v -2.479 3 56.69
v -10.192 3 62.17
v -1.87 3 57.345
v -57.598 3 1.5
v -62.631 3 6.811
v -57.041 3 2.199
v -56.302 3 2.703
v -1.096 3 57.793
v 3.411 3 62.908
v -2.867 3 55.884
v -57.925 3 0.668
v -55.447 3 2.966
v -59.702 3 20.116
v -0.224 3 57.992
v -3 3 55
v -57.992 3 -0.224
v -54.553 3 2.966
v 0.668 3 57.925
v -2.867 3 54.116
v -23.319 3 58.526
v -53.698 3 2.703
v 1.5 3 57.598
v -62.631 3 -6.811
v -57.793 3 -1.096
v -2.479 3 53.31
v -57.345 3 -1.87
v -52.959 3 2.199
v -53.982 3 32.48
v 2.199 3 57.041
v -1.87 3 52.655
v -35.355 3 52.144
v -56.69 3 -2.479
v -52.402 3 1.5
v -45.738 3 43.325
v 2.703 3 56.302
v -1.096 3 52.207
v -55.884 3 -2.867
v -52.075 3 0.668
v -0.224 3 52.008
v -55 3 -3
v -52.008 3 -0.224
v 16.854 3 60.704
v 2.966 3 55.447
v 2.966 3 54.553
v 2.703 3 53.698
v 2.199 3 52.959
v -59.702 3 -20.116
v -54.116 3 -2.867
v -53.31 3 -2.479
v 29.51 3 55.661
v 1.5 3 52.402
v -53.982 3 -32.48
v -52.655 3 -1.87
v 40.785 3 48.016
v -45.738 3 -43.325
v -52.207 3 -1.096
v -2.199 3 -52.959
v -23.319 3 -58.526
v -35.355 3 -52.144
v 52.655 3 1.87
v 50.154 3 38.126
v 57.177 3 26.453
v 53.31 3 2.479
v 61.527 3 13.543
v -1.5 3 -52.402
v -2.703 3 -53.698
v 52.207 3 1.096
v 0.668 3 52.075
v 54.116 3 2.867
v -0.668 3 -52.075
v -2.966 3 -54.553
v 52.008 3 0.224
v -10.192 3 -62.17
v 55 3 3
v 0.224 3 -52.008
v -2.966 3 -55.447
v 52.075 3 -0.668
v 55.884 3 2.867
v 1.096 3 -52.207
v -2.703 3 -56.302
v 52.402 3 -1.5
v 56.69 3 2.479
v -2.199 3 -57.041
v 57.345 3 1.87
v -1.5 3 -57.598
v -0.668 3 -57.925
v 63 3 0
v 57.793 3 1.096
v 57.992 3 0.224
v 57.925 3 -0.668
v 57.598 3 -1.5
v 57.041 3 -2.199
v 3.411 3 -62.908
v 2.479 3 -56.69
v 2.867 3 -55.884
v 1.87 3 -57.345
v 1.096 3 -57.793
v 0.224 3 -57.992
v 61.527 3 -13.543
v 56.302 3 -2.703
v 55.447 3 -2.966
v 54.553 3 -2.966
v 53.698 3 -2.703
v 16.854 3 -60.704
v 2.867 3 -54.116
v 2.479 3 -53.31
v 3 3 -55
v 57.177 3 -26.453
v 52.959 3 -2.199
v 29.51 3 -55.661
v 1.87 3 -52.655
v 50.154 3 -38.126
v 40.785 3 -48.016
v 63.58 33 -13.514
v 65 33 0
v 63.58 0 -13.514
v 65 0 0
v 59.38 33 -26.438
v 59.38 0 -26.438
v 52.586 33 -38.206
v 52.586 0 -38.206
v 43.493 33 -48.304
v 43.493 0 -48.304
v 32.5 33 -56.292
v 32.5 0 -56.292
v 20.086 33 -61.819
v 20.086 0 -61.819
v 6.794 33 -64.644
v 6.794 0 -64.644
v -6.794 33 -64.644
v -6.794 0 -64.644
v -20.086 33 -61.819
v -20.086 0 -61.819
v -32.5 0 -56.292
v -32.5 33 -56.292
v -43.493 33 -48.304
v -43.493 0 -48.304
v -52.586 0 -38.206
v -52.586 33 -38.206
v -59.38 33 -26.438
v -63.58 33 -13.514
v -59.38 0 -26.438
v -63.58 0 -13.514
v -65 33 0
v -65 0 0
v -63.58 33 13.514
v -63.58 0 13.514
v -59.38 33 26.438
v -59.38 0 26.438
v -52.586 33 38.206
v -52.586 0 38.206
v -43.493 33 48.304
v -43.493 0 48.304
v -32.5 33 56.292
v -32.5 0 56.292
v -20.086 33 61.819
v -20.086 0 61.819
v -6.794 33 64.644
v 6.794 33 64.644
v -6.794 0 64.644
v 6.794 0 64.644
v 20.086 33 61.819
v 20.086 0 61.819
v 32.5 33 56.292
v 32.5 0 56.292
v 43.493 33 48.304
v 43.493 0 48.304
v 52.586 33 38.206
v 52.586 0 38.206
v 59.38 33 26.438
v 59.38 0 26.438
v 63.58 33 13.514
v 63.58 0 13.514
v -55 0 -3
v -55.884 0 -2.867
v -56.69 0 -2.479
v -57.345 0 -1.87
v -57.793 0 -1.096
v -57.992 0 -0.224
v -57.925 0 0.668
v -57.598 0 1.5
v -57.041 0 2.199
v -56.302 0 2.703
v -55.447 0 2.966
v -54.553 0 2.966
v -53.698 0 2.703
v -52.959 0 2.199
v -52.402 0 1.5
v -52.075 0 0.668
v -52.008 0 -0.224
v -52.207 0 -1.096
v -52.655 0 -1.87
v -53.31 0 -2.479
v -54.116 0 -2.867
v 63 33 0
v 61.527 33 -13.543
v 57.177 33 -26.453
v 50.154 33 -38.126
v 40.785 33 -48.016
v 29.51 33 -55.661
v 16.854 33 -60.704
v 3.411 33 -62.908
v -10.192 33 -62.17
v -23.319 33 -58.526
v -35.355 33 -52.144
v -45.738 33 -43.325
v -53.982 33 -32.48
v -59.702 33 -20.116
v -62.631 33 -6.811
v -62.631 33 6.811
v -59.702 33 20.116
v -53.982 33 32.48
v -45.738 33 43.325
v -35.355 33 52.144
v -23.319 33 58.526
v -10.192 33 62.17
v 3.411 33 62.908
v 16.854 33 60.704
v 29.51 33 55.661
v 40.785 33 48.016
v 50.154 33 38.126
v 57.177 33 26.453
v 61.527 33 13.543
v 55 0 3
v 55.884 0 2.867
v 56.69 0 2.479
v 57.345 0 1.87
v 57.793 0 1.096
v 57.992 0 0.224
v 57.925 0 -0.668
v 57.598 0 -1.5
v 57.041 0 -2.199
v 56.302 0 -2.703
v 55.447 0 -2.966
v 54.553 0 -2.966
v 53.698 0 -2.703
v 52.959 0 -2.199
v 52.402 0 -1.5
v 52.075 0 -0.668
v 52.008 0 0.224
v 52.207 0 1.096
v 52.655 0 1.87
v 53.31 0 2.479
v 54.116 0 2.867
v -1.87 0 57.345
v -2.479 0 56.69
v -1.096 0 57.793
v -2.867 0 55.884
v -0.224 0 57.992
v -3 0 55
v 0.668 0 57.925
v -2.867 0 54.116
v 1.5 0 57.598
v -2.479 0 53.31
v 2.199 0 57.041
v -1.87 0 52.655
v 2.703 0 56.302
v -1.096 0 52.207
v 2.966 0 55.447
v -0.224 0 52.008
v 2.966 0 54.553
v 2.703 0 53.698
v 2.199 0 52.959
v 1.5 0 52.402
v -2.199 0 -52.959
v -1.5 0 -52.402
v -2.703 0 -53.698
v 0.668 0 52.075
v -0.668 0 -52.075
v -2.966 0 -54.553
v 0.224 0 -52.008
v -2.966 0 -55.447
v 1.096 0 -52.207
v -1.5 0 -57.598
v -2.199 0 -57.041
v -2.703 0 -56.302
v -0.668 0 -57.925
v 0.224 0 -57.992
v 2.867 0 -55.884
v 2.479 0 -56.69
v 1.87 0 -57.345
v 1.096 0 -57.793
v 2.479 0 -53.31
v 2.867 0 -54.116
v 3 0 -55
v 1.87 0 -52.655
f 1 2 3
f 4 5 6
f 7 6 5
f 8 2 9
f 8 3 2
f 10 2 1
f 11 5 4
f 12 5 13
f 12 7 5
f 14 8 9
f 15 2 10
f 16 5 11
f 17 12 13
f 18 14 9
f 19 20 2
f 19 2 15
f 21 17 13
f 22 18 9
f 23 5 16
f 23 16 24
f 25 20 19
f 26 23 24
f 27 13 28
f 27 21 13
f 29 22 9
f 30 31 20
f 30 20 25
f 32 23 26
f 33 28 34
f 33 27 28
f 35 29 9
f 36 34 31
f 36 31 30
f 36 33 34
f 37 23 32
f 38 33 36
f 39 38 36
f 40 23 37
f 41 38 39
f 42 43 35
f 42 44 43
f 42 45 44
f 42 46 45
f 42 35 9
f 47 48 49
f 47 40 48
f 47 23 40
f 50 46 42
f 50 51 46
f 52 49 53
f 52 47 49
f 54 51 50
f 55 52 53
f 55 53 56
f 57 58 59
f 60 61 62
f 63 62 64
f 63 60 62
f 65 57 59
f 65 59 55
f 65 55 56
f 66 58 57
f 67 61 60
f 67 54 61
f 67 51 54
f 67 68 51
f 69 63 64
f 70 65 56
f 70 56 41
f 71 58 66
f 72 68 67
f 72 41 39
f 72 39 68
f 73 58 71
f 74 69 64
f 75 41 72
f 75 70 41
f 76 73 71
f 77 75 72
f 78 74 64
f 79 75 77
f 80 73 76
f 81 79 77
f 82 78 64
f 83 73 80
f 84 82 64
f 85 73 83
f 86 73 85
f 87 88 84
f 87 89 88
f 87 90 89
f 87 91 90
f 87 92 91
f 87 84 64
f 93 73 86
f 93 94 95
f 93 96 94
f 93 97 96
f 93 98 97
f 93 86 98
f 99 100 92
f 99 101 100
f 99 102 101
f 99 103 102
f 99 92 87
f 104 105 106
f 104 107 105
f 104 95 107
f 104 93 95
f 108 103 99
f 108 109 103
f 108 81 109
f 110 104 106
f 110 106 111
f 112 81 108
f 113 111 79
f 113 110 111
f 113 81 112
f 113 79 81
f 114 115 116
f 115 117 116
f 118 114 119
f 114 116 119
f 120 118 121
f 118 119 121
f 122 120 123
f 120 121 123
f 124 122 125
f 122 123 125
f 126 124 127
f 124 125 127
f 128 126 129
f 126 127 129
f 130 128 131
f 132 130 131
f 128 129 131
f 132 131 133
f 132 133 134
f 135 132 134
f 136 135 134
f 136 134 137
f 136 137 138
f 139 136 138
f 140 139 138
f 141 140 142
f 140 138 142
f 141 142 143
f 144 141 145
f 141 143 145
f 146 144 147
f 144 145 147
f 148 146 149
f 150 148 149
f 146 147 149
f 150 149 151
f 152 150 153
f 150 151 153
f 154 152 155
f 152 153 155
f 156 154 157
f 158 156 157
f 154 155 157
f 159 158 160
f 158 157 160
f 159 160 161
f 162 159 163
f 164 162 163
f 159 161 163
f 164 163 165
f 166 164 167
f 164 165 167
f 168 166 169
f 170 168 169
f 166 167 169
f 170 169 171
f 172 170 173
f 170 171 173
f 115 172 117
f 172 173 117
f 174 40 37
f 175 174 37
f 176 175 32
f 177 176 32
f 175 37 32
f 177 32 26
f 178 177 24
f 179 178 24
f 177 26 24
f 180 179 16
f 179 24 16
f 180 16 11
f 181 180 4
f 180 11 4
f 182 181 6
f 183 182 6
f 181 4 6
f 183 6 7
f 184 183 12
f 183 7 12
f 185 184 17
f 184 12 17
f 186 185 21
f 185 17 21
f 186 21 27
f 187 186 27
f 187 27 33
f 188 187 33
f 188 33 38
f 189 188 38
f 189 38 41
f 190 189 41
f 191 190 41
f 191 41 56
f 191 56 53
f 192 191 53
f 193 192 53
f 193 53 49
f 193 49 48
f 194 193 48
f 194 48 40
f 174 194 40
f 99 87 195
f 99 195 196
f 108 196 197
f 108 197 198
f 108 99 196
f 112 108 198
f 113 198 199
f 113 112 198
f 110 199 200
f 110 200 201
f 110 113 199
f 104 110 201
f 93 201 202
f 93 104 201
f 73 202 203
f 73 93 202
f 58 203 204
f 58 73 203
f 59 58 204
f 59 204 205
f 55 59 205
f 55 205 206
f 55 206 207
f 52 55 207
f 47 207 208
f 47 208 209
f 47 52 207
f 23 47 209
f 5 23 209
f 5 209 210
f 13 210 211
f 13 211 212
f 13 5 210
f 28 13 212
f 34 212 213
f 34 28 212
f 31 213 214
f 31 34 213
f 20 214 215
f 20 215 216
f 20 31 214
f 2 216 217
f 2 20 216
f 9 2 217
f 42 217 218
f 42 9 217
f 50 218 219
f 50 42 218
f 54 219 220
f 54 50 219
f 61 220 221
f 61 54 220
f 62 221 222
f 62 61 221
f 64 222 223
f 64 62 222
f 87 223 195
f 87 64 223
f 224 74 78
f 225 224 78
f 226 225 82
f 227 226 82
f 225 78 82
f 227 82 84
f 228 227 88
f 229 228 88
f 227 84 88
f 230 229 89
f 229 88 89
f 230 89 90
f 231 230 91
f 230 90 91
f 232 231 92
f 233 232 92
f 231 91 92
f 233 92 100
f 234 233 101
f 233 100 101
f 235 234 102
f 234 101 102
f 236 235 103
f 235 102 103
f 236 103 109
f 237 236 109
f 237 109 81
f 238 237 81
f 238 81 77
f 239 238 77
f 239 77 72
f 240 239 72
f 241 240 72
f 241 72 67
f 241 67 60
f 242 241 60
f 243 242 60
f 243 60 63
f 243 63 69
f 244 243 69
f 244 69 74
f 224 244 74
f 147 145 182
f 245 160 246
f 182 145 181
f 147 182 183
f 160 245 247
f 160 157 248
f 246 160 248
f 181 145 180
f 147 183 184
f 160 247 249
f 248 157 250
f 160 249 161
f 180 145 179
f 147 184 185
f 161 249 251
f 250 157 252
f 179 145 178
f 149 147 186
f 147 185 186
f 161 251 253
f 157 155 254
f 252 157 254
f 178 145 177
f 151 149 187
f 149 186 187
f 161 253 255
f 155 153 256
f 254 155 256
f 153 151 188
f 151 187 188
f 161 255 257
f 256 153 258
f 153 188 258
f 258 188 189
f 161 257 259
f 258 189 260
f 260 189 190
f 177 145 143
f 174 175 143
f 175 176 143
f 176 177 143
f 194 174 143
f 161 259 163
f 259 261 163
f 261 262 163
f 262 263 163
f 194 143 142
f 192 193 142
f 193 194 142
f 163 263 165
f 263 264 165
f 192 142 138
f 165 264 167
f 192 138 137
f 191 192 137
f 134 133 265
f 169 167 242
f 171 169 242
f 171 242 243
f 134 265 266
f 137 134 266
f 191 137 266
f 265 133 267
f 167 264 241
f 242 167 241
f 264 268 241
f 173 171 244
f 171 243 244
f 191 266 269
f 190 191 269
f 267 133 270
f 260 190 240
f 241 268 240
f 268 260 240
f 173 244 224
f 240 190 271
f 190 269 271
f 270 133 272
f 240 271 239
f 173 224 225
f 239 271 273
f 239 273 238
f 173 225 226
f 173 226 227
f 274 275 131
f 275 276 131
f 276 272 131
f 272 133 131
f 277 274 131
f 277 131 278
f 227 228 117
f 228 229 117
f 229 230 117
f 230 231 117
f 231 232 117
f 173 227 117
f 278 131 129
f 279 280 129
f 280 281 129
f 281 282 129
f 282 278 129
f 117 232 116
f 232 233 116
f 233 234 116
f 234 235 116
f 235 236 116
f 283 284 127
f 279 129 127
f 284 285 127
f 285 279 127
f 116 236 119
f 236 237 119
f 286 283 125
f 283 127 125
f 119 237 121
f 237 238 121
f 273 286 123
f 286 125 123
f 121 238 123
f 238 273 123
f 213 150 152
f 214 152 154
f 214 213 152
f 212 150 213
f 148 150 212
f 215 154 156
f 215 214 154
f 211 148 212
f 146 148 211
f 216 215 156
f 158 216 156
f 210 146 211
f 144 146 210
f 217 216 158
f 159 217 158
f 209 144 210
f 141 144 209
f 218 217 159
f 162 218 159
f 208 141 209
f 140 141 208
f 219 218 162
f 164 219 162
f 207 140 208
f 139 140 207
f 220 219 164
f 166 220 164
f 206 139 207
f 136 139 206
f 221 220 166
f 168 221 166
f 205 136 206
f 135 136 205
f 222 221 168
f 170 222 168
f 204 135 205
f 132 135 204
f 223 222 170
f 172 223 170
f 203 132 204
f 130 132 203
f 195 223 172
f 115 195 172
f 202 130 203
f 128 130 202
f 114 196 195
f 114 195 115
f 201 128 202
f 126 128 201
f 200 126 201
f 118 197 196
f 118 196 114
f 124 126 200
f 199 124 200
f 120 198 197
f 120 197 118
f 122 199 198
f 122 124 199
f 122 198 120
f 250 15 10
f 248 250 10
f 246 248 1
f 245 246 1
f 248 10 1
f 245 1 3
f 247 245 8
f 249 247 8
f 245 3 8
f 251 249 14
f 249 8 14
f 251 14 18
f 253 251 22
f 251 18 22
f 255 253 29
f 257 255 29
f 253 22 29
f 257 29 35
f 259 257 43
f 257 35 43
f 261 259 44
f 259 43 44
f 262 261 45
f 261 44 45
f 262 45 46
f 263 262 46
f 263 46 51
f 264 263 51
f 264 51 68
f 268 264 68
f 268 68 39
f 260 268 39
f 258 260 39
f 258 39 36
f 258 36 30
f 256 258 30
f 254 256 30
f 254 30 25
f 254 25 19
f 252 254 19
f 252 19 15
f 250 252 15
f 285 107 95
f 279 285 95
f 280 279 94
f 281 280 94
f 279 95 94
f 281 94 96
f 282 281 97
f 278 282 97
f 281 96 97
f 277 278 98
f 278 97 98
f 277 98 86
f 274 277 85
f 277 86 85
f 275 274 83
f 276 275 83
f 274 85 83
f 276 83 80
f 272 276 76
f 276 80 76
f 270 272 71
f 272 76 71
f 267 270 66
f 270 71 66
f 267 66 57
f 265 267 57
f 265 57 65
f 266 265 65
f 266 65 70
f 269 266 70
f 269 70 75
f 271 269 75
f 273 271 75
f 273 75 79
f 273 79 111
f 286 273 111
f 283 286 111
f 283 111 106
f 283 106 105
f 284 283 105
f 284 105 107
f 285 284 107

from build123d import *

# Parameters (mm, degrees)
SKETCH1_R           = 65
BOSS_EXTRUDE1_DEPTH = 3
SKETCH2_R           = 3
CUT_EXTRUDE1_DEPTH  = 4
CIRPATTERN1_COUNT   = 4
SKETCH3_R           = 65
SKETCH3_R_2         = 63
BOSS_EXTRUDE2_DEPTH = 30


with BuildPart() as part:
    # Sketch1 → Boss-Extrude1 (new body)
    with BuildSketch(Plane(origin=(0, 0, 0), x_dir=(1, 0, 0), z_dir=(0, 1, 0))):
        Circle(SKETCH1_R)
    extrude(amount=BOSS_EXTRUDE1_DEPTH)

    # Sketch2 → Cut-Extrude1 (cut, through all)
    with BuildSketch(Plane(origin=(0, 3, 0), x_dir=(1, 0, 0), z_dir=(0, 1, 0))):
        with Locations((0, 55)):
            Circle(SKETCH2_R)
    cut_extrude1 = extrude(amount=-CUT_EXTRUDE1_DEPTH, mode=Mode.SUBTRACT)

    # CirPattern1: Cut-Extrude1 ×4 about axis
    cirpattern1_axis = Axis((0, 0, 0), (0, 1, 0))
    for i in range(1, CIRPATTERN1_COUNT):
        add(cut_extrude1.rotate(cirpattern1_axis, i * 360 / CIRPATTERN1_COUNT), mode=Mode.SUBTRACT)

    # Sketch3 → Boss-Extrude2 (add)
    with BuildSketch(Plane(origin=(0, 3, 0), x_dir=(1, 0, 0), z_dir=(0, 1, 0))):
        Circle(SKETCH3_R)
        Circle(SKETCH3_R_2, mode=Mode.SUBTRACT)
    extrude(amount=BOSS_EXTRUDE2_DEPTH)


solid = part.part
